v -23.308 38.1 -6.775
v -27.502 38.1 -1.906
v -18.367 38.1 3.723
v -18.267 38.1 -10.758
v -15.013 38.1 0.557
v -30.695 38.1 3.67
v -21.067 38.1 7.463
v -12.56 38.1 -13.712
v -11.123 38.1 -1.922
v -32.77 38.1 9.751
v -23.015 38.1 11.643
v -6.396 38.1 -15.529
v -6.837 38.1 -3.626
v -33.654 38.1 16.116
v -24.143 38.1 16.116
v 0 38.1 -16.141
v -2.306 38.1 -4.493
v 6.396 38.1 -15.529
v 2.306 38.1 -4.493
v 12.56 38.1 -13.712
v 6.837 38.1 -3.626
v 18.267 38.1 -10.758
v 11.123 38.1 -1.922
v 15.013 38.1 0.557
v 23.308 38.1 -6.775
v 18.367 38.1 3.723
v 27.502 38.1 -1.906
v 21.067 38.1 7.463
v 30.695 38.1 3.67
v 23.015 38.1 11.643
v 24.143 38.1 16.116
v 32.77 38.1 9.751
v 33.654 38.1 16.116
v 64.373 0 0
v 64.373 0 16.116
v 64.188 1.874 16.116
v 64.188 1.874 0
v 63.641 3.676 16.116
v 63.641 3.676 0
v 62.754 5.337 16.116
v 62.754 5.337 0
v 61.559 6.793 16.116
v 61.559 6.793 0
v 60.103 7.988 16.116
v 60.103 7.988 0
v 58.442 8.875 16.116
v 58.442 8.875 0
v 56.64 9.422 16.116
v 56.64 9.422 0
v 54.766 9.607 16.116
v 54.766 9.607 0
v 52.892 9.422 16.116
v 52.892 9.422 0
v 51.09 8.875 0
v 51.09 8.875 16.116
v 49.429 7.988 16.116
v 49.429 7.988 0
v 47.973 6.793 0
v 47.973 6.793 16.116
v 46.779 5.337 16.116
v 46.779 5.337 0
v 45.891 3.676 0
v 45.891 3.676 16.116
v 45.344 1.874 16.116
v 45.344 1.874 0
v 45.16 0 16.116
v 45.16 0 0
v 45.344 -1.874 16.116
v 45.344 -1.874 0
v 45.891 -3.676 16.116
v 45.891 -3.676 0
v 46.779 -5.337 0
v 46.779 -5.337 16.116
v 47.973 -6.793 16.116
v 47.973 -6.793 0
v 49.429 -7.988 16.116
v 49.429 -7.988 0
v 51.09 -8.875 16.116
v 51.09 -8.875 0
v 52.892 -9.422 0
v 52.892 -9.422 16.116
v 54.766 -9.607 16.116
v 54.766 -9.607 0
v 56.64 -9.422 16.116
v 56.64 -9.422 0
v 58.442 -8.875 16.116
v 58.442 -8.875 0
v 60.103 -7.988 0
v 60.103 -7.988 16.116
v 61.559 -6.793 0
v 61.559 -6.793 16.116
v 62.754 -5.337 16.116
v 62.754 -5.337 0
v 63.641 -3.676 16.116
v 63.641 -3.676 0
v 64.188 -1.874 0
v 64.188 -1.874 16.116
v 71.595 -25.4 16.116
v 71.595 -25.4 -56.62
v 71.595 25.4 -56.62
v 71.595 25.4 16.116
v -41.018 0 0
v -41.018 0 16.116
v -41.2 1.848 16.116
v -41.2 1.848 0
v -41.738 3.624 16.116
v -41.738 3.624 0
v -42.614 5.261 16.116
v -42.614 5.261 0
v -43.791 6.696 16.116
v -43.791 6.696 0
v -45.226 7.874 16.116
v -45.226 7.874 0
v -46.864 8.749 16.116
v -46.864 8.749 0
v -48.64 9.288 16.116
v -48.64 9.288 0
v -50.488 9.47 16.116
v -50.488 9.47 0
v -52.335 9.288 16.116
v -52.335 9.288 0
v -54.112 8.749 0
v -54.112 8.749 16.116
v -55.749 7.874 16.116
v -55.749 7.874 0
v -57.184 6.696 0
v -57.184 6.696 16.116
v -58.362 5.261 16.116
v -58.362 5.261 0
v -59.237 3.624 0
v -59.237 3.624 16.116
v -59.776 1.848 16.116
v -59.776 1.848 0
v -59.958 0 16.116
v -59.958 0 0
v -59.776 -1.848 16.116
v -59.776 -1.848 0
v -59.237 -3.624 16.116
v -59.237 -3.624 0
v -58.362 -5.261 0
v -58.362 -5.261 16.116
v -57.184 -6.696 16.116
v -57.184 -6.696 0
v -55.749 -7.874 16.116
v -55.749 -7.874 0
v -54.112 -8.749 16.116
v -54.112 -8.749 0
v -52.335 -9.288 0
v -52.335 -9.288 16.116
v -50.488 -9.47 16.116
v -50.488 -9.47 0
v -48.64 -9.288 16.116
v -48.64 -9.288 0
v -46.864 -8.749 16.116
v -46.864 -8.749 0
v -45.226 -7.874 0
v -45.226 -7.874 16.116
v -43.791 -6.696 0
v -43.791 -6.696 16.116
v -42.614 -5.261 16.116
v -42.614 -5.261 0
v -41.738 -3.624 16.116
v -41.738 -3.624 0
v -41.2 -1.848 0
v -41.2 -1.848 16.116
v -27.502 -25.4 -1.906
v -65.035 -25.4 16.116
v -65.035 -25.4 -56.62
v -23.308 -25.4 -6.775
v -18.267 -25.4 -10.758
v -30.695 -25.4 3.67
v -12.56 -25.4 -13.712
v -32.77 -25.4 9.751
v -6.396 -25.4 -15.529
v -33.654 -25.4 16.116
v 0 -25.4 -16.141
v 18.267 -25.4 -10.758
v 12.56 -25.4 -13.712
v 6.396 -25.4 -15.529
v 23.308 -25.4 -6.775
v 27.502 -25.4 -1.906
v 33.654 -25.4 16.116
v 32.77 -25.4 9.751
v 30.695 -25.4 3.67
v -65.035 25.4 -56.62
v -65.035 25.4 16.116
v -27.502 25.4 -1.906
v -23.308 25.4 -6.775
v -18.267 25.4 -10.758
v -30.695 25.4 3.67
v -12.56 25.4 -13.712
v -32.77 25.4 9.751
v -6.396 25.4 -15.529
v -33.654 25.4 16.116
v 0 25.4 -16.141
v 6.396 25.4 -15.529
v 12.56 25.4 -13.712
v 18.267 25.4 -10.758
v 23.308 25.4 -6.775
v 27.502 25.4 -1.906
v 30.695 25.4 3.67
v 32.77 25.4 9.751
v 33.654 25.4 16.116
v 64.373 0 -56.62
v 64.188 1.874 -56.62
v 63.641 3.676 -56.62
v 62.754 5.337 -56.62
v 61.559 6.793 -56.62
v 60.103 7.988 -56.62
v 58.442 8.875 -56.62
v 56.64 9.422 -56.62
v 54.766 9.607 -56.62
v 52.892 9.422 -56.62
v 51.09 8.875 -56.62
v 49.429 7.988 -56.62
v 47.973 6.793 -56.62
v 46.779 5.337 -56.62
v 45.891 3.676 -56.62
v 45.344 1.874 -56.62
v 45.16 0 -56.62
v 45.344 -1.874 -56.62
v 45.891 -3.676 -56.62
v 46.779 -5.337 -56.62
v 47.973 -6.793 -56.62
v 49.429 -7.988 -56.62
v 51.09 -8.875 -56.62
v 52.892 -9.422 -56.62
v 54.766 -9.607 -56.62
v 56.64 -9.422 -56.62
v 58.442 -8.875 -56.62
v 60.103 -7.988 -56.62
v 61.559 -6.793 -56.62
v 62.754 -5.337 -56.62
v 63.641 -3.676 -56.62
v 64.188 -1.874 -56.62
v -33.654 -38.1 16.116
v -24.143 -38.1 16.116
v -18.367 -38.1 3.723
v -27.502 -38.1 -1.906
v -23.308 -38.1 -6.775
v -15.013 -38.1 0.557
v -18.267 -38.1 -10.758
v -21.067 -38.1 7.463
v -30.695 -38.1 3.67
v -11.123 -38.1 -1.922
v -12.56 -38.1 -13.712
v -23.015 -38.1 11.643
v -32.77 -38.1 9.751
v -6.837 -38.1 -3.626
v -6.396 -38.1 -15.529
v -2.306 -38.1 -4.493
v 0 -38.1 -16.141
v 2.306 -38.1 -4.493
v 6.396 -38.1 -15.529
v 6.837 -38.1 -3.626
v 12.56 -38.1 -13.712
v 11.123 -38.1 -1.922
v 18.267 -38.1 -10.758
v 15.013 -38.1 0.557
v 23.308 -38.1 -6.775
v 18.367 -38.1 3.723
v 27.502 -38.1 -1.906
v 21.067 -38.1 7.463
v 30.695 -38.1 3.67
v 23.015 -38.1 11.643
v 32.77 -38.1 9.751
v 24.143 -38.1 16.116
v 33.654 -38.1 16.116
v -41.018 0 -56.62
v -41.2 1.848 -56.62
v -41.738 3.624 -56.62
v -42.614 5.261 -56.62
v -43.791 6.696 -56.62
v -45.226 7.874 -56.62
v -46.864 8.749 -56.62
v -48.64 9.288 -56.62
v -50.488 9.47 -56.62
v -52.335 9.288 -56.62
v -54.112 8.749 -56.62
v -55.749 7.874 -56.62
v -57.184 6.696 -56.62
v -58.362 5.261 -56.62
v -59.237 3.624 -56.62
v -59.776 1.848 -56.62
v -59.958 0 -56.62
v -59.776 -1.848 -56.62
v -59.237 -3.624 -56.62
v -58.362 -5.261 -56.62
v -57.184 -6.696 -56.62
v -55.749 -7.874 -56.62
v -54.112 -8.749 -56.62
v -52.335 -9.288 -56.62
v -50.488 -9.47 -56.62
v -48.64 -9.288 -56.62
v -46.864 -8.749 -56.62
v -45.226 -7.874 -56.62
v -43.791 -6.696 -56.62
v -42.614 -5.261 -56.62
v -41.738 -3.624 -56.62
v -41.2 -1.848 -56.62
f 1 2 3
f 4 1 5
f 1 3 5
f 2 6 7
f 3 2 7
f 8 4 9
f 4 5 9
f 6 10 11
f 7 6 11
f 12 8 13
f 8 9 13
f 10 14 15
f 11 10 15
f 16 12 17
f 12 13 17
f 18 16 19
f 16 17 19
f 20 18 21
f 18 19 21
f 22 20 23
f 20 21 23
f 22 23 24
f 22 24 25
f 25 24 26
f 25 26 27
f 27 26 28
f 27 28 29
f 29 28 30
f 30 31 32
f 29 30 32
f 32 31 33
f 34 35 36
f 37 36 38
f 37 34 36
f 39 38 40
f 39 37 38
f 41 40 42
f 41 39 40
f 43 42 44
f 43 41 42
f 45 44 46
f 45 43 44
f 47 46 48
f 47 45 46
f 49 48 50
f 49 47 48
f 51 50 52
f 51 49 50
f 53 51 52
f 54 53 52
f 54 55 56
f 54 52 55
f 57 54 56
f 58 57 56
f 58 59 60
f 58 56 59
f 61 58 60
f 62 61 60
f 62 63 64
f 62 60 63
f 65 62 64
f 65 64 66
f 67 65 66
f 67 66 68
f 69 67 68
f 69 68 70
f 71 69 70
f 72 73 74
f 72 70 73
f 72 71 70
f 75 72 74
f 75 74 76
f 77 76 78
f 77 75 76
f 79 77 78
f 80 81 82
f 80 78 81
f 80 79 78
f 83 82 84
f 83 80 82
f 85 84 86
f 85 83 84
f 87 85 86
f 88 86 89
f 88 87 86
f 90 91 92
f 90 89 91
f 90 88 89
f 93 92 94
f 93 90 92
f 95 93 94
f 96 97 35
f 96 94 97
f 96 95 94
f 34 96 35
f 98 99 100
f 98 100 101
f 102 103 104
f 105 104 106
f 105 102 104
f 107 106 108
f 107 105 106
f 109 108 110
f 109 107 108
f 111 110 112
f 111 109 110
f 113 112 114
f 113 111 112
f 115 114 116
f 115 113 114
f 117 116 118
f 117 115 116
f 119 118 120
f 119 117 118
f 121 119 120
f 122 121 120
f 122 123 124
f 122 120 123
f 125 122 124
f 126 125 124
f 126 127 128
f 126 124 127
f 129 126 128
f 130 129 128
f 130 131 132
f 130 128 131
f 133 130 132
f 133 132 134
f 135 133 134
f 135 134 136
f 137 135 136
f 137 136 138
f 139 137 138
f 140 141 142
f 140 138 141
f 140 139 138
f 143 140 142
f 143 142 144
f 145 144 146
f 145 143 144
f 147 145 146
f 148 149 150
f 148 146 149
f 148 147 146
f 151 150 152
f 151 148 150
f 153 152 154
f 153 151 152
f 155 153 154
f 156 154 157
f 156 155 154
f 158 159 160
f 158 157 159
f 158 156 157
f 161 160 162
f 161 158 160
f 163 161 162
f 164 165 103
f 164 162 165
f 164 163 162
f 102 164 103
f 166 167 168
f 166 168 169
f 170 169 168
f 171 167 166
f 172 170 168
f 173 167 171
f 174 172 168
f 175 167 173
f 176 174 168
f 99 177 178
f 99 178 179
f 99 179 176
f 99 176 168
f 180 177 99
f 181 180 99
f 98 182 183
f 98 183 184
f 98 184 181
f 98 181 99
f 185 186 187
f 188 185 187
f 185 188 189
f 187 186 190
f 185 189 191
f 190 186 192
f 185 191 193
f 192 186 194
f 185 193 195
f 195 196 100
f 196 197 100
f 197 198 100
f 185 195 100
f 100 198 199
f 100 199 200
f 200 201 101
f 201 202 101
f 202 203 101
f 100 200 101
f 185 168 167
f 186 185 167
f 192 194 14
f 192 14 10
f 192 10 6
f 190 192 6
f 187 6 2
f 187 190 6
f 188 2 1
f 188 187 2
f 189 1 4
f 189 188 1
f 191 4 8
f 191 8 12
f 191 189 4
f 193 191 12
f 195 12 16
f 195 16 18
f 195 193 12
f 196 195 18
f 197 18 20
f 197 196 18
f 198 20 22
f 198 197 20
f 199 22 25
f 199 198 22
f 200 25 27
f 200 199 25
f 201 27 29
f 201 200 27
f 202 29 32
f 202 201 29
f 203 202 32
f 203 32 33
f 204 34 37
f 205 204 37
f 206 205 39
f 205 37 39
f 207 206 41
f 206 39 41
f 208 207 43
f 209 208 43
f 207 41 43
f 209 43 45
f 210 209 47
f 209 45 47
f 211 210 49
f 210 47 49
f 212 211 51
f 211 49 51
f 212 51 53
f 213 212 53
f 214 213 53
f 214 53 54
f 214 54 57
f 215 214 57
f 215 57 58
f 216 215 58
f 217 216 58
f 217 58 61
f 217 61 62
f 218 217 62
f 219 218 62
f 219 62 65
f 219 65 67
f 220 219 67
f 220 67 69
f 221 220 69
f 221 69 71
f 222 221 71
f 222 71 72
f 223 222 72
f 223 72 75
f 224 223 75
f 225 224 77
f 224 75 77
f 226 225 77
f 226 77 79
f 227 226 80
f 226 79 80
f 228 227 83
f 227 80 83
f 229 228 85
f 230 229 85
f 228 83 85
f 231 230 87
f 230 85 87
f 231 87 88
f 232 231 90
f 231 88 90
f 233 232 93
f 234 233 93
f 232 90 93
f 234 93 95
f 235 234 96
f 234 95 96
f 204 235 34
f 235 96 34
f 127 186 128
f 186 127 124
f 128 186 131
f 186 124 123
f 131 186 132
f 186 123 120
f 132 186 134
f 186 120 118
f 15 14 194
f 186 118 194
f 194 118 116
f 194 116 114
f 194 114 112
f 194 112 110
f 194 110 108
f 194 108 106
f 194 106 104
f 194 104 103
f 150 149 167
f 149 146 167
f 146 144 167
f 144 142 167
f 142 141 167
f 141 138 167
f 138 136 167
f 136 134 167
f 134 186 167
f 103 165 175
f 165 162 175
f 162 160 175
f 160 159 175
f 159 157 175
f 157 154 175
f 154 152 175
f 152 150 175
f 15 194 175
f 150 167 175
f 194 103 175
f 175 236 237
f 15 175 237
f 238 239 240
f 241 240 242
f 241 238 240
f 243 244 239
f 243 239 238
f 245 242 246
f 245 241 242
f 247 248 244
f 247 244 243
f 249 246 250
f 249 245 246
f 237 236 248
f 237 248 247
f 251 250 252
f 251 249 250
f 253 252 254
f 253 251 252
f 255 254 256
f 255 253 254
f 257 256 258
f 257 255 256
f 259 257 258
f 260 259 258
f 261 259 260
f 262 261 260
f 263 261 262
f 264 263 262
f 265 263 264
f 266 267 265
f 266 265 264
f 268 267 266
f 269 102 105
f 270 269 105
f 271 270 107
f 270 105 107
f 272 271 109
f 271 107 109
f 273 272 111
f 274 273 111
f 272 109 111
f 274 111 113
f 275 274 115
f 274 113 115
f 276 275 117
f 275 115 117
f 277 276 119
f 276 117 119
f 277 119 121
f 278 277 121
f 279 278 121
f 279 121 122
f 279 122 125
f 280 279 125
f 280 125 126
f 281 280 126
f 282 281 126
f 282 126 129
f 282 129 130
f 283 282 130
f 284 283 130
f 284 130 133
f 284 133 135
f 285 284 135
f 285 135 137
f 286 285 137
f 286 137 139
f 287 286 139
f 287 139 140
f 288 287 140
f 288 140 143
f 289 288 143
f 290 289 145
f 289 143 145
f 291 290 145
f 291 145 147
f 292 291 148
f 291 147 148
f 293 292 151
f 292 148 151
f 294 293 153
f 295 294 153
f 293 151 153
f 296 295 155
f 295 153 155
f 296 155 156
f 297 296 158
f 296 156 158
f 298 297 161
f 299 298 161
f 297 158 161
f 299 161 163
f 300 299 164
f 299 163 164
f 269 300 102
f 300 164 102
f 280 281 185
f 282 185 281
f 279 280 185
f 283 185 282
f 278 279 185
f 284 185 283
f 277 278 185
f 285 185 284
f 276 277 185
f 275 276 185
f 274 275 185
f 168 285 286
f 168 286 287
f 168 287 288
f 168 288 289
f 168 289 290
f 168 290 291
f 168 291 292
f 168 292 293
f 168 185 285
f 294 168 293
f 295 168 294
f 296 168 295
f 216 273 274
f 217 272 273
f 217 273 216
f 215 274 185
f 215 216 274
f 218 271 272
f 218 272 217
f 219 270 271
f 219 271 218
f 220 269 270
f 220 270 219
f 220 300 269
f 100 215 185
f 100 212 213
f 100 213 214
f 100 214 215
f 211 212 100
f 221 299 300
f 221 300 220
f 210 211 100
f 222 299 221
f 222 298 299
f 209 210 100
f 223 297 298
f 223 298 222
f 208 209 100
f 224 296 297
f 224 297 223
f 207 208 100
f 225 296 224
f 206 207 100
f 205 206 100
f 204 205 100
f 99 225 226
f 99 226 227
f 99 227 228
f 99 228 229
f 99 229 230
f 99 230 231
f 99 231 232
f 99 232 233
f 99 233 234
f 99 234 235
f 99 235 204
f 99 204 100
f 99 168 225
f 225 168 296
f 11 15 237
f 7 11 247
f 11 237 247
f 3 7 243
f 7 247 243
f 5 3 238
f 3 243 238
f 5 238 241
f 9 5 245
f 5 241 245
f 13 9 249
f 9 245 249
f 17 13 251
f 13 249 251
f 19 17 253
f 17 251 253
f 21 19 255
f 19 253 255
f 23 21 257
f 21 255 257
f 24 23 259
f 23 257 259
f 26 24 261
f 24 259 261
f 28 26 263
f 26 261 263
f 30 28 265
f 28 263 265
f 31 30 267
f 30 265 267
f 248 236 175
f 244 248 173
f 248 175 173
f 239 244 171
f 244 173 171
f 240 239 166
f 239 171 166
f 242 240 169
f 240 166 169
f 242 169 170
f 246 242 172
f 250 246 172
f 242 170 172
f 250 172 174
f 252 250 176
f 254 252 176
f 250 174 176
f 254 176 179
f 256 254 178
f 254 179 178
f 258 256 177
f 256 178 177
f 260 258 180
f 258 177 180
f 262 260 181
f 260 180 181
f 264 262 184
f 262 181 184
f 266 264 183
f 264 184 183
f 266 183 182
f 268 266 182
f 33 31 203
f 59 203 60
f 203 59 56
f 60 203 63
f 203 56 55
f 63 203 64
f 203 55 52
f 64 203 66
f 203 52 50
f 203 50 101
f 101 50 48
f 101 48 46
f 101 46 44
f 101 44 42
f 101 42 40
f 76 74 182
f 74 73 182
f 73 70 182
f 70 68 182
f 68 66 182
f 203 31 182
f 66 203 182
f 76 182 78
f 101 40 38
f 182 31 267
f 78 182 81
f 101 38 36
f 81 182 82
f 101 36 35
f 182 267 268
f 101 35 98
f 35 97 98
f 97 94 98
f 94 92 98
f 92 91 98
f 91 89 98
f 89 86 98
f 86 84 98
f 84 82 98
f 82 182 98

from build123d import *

# Parameters (mm, degrees)
F0_W          = 136.6302669048
F0_H          = 117.5191476941
F1_DEPTH      = 25.4
F1_DEPTH_BACK = 25.4
F2_R          = 33.6837672498
F3_DEPTH      = 38.1
F3_DEPTH_BACK = 38.1
F4_R          = 24.4259968854
F5_DEPTH      = 38.101
F5_DEPTH_BACK = 38.101
F6_W          = 151.7480313778
F6_H          = 49.3466332555
F7_DEPTH      = 38.101
F7_DEPTH_BACK = 38.101
F8_R          = 9.4700300279
F8_R_2        = 9.6065127636
F9_DEPTH      = 56.6212700138
F9_DEPTH_BACK = 16.1170975695


with BuildPart() as f1:
    # F0 (on Front) → F1 (new body, two sides)
    with BuildSketch(Plane.XZ) as f1_sk:
        with Locations((3.2802671194, 2.1393038332)):
            Rectangle(F0_W, F0_H)
    extrude(amount=F1_DEPTH)
    extrude(f1_sk.sketch, amount=-F1_DEPTH_BACK)

    # F2 (on Front) → F3 (join, two sides)
    with BuildSketch(Plane.XZ) as f3_sk:
        with Locations((0, 17.5422988832)):
            Circle(F2_R)
    extrude(amount=F3_DEPTH)
    extrude(f3_sk.sketch, amount=-F3_DEPTH_BACK)

    # F4 (on Front) → F5 (cut, two sides)
    with BuildSketch(Plane.XZ) as f5_sk:
        with Locations((0, 19.8242235929)):
            Circle(F4_R)
    extrude(amount=-F5_DEPTH, mode=Mode.SUBTRACT)
    extrude(f5_sk.sketch, amount=F5_DEPTH_BACK, mode=Mode.SUBTRACT)

    # F6 (on Front) → F7 (cut, two sides)
    with BuildSketch(Plane.XZ) as f7_sk:
        with Locations((0, 40.7894141972)):
            Rectangle(F6_W, F6_H)
    extrude(amount=-F7_DEPTH, mode=Mode.SUBTRACT)
    extrude(f7_sk.sketch, amount=F7_DEPTH_BACK, mode=Mode.SUBTRACT)

    # F8 (on Top) → F9 (cut, two sides)
    with BuildSketch(Plane.XY) as f9_sk:
        with Locations((-50.4875965416, 0)):
            Circle(F8_R)
        with Locations((54.7662004828, 0)):
            Circle(F8_R_2)
    extrude(amount=-F9_DEPTH, mode=Mode.SUBTRACT)
    extrude(f9_sk.sketch, amount=F9_DEPTH_BACK, mode=Mode.SUBTRACT)


solid = f1.part
